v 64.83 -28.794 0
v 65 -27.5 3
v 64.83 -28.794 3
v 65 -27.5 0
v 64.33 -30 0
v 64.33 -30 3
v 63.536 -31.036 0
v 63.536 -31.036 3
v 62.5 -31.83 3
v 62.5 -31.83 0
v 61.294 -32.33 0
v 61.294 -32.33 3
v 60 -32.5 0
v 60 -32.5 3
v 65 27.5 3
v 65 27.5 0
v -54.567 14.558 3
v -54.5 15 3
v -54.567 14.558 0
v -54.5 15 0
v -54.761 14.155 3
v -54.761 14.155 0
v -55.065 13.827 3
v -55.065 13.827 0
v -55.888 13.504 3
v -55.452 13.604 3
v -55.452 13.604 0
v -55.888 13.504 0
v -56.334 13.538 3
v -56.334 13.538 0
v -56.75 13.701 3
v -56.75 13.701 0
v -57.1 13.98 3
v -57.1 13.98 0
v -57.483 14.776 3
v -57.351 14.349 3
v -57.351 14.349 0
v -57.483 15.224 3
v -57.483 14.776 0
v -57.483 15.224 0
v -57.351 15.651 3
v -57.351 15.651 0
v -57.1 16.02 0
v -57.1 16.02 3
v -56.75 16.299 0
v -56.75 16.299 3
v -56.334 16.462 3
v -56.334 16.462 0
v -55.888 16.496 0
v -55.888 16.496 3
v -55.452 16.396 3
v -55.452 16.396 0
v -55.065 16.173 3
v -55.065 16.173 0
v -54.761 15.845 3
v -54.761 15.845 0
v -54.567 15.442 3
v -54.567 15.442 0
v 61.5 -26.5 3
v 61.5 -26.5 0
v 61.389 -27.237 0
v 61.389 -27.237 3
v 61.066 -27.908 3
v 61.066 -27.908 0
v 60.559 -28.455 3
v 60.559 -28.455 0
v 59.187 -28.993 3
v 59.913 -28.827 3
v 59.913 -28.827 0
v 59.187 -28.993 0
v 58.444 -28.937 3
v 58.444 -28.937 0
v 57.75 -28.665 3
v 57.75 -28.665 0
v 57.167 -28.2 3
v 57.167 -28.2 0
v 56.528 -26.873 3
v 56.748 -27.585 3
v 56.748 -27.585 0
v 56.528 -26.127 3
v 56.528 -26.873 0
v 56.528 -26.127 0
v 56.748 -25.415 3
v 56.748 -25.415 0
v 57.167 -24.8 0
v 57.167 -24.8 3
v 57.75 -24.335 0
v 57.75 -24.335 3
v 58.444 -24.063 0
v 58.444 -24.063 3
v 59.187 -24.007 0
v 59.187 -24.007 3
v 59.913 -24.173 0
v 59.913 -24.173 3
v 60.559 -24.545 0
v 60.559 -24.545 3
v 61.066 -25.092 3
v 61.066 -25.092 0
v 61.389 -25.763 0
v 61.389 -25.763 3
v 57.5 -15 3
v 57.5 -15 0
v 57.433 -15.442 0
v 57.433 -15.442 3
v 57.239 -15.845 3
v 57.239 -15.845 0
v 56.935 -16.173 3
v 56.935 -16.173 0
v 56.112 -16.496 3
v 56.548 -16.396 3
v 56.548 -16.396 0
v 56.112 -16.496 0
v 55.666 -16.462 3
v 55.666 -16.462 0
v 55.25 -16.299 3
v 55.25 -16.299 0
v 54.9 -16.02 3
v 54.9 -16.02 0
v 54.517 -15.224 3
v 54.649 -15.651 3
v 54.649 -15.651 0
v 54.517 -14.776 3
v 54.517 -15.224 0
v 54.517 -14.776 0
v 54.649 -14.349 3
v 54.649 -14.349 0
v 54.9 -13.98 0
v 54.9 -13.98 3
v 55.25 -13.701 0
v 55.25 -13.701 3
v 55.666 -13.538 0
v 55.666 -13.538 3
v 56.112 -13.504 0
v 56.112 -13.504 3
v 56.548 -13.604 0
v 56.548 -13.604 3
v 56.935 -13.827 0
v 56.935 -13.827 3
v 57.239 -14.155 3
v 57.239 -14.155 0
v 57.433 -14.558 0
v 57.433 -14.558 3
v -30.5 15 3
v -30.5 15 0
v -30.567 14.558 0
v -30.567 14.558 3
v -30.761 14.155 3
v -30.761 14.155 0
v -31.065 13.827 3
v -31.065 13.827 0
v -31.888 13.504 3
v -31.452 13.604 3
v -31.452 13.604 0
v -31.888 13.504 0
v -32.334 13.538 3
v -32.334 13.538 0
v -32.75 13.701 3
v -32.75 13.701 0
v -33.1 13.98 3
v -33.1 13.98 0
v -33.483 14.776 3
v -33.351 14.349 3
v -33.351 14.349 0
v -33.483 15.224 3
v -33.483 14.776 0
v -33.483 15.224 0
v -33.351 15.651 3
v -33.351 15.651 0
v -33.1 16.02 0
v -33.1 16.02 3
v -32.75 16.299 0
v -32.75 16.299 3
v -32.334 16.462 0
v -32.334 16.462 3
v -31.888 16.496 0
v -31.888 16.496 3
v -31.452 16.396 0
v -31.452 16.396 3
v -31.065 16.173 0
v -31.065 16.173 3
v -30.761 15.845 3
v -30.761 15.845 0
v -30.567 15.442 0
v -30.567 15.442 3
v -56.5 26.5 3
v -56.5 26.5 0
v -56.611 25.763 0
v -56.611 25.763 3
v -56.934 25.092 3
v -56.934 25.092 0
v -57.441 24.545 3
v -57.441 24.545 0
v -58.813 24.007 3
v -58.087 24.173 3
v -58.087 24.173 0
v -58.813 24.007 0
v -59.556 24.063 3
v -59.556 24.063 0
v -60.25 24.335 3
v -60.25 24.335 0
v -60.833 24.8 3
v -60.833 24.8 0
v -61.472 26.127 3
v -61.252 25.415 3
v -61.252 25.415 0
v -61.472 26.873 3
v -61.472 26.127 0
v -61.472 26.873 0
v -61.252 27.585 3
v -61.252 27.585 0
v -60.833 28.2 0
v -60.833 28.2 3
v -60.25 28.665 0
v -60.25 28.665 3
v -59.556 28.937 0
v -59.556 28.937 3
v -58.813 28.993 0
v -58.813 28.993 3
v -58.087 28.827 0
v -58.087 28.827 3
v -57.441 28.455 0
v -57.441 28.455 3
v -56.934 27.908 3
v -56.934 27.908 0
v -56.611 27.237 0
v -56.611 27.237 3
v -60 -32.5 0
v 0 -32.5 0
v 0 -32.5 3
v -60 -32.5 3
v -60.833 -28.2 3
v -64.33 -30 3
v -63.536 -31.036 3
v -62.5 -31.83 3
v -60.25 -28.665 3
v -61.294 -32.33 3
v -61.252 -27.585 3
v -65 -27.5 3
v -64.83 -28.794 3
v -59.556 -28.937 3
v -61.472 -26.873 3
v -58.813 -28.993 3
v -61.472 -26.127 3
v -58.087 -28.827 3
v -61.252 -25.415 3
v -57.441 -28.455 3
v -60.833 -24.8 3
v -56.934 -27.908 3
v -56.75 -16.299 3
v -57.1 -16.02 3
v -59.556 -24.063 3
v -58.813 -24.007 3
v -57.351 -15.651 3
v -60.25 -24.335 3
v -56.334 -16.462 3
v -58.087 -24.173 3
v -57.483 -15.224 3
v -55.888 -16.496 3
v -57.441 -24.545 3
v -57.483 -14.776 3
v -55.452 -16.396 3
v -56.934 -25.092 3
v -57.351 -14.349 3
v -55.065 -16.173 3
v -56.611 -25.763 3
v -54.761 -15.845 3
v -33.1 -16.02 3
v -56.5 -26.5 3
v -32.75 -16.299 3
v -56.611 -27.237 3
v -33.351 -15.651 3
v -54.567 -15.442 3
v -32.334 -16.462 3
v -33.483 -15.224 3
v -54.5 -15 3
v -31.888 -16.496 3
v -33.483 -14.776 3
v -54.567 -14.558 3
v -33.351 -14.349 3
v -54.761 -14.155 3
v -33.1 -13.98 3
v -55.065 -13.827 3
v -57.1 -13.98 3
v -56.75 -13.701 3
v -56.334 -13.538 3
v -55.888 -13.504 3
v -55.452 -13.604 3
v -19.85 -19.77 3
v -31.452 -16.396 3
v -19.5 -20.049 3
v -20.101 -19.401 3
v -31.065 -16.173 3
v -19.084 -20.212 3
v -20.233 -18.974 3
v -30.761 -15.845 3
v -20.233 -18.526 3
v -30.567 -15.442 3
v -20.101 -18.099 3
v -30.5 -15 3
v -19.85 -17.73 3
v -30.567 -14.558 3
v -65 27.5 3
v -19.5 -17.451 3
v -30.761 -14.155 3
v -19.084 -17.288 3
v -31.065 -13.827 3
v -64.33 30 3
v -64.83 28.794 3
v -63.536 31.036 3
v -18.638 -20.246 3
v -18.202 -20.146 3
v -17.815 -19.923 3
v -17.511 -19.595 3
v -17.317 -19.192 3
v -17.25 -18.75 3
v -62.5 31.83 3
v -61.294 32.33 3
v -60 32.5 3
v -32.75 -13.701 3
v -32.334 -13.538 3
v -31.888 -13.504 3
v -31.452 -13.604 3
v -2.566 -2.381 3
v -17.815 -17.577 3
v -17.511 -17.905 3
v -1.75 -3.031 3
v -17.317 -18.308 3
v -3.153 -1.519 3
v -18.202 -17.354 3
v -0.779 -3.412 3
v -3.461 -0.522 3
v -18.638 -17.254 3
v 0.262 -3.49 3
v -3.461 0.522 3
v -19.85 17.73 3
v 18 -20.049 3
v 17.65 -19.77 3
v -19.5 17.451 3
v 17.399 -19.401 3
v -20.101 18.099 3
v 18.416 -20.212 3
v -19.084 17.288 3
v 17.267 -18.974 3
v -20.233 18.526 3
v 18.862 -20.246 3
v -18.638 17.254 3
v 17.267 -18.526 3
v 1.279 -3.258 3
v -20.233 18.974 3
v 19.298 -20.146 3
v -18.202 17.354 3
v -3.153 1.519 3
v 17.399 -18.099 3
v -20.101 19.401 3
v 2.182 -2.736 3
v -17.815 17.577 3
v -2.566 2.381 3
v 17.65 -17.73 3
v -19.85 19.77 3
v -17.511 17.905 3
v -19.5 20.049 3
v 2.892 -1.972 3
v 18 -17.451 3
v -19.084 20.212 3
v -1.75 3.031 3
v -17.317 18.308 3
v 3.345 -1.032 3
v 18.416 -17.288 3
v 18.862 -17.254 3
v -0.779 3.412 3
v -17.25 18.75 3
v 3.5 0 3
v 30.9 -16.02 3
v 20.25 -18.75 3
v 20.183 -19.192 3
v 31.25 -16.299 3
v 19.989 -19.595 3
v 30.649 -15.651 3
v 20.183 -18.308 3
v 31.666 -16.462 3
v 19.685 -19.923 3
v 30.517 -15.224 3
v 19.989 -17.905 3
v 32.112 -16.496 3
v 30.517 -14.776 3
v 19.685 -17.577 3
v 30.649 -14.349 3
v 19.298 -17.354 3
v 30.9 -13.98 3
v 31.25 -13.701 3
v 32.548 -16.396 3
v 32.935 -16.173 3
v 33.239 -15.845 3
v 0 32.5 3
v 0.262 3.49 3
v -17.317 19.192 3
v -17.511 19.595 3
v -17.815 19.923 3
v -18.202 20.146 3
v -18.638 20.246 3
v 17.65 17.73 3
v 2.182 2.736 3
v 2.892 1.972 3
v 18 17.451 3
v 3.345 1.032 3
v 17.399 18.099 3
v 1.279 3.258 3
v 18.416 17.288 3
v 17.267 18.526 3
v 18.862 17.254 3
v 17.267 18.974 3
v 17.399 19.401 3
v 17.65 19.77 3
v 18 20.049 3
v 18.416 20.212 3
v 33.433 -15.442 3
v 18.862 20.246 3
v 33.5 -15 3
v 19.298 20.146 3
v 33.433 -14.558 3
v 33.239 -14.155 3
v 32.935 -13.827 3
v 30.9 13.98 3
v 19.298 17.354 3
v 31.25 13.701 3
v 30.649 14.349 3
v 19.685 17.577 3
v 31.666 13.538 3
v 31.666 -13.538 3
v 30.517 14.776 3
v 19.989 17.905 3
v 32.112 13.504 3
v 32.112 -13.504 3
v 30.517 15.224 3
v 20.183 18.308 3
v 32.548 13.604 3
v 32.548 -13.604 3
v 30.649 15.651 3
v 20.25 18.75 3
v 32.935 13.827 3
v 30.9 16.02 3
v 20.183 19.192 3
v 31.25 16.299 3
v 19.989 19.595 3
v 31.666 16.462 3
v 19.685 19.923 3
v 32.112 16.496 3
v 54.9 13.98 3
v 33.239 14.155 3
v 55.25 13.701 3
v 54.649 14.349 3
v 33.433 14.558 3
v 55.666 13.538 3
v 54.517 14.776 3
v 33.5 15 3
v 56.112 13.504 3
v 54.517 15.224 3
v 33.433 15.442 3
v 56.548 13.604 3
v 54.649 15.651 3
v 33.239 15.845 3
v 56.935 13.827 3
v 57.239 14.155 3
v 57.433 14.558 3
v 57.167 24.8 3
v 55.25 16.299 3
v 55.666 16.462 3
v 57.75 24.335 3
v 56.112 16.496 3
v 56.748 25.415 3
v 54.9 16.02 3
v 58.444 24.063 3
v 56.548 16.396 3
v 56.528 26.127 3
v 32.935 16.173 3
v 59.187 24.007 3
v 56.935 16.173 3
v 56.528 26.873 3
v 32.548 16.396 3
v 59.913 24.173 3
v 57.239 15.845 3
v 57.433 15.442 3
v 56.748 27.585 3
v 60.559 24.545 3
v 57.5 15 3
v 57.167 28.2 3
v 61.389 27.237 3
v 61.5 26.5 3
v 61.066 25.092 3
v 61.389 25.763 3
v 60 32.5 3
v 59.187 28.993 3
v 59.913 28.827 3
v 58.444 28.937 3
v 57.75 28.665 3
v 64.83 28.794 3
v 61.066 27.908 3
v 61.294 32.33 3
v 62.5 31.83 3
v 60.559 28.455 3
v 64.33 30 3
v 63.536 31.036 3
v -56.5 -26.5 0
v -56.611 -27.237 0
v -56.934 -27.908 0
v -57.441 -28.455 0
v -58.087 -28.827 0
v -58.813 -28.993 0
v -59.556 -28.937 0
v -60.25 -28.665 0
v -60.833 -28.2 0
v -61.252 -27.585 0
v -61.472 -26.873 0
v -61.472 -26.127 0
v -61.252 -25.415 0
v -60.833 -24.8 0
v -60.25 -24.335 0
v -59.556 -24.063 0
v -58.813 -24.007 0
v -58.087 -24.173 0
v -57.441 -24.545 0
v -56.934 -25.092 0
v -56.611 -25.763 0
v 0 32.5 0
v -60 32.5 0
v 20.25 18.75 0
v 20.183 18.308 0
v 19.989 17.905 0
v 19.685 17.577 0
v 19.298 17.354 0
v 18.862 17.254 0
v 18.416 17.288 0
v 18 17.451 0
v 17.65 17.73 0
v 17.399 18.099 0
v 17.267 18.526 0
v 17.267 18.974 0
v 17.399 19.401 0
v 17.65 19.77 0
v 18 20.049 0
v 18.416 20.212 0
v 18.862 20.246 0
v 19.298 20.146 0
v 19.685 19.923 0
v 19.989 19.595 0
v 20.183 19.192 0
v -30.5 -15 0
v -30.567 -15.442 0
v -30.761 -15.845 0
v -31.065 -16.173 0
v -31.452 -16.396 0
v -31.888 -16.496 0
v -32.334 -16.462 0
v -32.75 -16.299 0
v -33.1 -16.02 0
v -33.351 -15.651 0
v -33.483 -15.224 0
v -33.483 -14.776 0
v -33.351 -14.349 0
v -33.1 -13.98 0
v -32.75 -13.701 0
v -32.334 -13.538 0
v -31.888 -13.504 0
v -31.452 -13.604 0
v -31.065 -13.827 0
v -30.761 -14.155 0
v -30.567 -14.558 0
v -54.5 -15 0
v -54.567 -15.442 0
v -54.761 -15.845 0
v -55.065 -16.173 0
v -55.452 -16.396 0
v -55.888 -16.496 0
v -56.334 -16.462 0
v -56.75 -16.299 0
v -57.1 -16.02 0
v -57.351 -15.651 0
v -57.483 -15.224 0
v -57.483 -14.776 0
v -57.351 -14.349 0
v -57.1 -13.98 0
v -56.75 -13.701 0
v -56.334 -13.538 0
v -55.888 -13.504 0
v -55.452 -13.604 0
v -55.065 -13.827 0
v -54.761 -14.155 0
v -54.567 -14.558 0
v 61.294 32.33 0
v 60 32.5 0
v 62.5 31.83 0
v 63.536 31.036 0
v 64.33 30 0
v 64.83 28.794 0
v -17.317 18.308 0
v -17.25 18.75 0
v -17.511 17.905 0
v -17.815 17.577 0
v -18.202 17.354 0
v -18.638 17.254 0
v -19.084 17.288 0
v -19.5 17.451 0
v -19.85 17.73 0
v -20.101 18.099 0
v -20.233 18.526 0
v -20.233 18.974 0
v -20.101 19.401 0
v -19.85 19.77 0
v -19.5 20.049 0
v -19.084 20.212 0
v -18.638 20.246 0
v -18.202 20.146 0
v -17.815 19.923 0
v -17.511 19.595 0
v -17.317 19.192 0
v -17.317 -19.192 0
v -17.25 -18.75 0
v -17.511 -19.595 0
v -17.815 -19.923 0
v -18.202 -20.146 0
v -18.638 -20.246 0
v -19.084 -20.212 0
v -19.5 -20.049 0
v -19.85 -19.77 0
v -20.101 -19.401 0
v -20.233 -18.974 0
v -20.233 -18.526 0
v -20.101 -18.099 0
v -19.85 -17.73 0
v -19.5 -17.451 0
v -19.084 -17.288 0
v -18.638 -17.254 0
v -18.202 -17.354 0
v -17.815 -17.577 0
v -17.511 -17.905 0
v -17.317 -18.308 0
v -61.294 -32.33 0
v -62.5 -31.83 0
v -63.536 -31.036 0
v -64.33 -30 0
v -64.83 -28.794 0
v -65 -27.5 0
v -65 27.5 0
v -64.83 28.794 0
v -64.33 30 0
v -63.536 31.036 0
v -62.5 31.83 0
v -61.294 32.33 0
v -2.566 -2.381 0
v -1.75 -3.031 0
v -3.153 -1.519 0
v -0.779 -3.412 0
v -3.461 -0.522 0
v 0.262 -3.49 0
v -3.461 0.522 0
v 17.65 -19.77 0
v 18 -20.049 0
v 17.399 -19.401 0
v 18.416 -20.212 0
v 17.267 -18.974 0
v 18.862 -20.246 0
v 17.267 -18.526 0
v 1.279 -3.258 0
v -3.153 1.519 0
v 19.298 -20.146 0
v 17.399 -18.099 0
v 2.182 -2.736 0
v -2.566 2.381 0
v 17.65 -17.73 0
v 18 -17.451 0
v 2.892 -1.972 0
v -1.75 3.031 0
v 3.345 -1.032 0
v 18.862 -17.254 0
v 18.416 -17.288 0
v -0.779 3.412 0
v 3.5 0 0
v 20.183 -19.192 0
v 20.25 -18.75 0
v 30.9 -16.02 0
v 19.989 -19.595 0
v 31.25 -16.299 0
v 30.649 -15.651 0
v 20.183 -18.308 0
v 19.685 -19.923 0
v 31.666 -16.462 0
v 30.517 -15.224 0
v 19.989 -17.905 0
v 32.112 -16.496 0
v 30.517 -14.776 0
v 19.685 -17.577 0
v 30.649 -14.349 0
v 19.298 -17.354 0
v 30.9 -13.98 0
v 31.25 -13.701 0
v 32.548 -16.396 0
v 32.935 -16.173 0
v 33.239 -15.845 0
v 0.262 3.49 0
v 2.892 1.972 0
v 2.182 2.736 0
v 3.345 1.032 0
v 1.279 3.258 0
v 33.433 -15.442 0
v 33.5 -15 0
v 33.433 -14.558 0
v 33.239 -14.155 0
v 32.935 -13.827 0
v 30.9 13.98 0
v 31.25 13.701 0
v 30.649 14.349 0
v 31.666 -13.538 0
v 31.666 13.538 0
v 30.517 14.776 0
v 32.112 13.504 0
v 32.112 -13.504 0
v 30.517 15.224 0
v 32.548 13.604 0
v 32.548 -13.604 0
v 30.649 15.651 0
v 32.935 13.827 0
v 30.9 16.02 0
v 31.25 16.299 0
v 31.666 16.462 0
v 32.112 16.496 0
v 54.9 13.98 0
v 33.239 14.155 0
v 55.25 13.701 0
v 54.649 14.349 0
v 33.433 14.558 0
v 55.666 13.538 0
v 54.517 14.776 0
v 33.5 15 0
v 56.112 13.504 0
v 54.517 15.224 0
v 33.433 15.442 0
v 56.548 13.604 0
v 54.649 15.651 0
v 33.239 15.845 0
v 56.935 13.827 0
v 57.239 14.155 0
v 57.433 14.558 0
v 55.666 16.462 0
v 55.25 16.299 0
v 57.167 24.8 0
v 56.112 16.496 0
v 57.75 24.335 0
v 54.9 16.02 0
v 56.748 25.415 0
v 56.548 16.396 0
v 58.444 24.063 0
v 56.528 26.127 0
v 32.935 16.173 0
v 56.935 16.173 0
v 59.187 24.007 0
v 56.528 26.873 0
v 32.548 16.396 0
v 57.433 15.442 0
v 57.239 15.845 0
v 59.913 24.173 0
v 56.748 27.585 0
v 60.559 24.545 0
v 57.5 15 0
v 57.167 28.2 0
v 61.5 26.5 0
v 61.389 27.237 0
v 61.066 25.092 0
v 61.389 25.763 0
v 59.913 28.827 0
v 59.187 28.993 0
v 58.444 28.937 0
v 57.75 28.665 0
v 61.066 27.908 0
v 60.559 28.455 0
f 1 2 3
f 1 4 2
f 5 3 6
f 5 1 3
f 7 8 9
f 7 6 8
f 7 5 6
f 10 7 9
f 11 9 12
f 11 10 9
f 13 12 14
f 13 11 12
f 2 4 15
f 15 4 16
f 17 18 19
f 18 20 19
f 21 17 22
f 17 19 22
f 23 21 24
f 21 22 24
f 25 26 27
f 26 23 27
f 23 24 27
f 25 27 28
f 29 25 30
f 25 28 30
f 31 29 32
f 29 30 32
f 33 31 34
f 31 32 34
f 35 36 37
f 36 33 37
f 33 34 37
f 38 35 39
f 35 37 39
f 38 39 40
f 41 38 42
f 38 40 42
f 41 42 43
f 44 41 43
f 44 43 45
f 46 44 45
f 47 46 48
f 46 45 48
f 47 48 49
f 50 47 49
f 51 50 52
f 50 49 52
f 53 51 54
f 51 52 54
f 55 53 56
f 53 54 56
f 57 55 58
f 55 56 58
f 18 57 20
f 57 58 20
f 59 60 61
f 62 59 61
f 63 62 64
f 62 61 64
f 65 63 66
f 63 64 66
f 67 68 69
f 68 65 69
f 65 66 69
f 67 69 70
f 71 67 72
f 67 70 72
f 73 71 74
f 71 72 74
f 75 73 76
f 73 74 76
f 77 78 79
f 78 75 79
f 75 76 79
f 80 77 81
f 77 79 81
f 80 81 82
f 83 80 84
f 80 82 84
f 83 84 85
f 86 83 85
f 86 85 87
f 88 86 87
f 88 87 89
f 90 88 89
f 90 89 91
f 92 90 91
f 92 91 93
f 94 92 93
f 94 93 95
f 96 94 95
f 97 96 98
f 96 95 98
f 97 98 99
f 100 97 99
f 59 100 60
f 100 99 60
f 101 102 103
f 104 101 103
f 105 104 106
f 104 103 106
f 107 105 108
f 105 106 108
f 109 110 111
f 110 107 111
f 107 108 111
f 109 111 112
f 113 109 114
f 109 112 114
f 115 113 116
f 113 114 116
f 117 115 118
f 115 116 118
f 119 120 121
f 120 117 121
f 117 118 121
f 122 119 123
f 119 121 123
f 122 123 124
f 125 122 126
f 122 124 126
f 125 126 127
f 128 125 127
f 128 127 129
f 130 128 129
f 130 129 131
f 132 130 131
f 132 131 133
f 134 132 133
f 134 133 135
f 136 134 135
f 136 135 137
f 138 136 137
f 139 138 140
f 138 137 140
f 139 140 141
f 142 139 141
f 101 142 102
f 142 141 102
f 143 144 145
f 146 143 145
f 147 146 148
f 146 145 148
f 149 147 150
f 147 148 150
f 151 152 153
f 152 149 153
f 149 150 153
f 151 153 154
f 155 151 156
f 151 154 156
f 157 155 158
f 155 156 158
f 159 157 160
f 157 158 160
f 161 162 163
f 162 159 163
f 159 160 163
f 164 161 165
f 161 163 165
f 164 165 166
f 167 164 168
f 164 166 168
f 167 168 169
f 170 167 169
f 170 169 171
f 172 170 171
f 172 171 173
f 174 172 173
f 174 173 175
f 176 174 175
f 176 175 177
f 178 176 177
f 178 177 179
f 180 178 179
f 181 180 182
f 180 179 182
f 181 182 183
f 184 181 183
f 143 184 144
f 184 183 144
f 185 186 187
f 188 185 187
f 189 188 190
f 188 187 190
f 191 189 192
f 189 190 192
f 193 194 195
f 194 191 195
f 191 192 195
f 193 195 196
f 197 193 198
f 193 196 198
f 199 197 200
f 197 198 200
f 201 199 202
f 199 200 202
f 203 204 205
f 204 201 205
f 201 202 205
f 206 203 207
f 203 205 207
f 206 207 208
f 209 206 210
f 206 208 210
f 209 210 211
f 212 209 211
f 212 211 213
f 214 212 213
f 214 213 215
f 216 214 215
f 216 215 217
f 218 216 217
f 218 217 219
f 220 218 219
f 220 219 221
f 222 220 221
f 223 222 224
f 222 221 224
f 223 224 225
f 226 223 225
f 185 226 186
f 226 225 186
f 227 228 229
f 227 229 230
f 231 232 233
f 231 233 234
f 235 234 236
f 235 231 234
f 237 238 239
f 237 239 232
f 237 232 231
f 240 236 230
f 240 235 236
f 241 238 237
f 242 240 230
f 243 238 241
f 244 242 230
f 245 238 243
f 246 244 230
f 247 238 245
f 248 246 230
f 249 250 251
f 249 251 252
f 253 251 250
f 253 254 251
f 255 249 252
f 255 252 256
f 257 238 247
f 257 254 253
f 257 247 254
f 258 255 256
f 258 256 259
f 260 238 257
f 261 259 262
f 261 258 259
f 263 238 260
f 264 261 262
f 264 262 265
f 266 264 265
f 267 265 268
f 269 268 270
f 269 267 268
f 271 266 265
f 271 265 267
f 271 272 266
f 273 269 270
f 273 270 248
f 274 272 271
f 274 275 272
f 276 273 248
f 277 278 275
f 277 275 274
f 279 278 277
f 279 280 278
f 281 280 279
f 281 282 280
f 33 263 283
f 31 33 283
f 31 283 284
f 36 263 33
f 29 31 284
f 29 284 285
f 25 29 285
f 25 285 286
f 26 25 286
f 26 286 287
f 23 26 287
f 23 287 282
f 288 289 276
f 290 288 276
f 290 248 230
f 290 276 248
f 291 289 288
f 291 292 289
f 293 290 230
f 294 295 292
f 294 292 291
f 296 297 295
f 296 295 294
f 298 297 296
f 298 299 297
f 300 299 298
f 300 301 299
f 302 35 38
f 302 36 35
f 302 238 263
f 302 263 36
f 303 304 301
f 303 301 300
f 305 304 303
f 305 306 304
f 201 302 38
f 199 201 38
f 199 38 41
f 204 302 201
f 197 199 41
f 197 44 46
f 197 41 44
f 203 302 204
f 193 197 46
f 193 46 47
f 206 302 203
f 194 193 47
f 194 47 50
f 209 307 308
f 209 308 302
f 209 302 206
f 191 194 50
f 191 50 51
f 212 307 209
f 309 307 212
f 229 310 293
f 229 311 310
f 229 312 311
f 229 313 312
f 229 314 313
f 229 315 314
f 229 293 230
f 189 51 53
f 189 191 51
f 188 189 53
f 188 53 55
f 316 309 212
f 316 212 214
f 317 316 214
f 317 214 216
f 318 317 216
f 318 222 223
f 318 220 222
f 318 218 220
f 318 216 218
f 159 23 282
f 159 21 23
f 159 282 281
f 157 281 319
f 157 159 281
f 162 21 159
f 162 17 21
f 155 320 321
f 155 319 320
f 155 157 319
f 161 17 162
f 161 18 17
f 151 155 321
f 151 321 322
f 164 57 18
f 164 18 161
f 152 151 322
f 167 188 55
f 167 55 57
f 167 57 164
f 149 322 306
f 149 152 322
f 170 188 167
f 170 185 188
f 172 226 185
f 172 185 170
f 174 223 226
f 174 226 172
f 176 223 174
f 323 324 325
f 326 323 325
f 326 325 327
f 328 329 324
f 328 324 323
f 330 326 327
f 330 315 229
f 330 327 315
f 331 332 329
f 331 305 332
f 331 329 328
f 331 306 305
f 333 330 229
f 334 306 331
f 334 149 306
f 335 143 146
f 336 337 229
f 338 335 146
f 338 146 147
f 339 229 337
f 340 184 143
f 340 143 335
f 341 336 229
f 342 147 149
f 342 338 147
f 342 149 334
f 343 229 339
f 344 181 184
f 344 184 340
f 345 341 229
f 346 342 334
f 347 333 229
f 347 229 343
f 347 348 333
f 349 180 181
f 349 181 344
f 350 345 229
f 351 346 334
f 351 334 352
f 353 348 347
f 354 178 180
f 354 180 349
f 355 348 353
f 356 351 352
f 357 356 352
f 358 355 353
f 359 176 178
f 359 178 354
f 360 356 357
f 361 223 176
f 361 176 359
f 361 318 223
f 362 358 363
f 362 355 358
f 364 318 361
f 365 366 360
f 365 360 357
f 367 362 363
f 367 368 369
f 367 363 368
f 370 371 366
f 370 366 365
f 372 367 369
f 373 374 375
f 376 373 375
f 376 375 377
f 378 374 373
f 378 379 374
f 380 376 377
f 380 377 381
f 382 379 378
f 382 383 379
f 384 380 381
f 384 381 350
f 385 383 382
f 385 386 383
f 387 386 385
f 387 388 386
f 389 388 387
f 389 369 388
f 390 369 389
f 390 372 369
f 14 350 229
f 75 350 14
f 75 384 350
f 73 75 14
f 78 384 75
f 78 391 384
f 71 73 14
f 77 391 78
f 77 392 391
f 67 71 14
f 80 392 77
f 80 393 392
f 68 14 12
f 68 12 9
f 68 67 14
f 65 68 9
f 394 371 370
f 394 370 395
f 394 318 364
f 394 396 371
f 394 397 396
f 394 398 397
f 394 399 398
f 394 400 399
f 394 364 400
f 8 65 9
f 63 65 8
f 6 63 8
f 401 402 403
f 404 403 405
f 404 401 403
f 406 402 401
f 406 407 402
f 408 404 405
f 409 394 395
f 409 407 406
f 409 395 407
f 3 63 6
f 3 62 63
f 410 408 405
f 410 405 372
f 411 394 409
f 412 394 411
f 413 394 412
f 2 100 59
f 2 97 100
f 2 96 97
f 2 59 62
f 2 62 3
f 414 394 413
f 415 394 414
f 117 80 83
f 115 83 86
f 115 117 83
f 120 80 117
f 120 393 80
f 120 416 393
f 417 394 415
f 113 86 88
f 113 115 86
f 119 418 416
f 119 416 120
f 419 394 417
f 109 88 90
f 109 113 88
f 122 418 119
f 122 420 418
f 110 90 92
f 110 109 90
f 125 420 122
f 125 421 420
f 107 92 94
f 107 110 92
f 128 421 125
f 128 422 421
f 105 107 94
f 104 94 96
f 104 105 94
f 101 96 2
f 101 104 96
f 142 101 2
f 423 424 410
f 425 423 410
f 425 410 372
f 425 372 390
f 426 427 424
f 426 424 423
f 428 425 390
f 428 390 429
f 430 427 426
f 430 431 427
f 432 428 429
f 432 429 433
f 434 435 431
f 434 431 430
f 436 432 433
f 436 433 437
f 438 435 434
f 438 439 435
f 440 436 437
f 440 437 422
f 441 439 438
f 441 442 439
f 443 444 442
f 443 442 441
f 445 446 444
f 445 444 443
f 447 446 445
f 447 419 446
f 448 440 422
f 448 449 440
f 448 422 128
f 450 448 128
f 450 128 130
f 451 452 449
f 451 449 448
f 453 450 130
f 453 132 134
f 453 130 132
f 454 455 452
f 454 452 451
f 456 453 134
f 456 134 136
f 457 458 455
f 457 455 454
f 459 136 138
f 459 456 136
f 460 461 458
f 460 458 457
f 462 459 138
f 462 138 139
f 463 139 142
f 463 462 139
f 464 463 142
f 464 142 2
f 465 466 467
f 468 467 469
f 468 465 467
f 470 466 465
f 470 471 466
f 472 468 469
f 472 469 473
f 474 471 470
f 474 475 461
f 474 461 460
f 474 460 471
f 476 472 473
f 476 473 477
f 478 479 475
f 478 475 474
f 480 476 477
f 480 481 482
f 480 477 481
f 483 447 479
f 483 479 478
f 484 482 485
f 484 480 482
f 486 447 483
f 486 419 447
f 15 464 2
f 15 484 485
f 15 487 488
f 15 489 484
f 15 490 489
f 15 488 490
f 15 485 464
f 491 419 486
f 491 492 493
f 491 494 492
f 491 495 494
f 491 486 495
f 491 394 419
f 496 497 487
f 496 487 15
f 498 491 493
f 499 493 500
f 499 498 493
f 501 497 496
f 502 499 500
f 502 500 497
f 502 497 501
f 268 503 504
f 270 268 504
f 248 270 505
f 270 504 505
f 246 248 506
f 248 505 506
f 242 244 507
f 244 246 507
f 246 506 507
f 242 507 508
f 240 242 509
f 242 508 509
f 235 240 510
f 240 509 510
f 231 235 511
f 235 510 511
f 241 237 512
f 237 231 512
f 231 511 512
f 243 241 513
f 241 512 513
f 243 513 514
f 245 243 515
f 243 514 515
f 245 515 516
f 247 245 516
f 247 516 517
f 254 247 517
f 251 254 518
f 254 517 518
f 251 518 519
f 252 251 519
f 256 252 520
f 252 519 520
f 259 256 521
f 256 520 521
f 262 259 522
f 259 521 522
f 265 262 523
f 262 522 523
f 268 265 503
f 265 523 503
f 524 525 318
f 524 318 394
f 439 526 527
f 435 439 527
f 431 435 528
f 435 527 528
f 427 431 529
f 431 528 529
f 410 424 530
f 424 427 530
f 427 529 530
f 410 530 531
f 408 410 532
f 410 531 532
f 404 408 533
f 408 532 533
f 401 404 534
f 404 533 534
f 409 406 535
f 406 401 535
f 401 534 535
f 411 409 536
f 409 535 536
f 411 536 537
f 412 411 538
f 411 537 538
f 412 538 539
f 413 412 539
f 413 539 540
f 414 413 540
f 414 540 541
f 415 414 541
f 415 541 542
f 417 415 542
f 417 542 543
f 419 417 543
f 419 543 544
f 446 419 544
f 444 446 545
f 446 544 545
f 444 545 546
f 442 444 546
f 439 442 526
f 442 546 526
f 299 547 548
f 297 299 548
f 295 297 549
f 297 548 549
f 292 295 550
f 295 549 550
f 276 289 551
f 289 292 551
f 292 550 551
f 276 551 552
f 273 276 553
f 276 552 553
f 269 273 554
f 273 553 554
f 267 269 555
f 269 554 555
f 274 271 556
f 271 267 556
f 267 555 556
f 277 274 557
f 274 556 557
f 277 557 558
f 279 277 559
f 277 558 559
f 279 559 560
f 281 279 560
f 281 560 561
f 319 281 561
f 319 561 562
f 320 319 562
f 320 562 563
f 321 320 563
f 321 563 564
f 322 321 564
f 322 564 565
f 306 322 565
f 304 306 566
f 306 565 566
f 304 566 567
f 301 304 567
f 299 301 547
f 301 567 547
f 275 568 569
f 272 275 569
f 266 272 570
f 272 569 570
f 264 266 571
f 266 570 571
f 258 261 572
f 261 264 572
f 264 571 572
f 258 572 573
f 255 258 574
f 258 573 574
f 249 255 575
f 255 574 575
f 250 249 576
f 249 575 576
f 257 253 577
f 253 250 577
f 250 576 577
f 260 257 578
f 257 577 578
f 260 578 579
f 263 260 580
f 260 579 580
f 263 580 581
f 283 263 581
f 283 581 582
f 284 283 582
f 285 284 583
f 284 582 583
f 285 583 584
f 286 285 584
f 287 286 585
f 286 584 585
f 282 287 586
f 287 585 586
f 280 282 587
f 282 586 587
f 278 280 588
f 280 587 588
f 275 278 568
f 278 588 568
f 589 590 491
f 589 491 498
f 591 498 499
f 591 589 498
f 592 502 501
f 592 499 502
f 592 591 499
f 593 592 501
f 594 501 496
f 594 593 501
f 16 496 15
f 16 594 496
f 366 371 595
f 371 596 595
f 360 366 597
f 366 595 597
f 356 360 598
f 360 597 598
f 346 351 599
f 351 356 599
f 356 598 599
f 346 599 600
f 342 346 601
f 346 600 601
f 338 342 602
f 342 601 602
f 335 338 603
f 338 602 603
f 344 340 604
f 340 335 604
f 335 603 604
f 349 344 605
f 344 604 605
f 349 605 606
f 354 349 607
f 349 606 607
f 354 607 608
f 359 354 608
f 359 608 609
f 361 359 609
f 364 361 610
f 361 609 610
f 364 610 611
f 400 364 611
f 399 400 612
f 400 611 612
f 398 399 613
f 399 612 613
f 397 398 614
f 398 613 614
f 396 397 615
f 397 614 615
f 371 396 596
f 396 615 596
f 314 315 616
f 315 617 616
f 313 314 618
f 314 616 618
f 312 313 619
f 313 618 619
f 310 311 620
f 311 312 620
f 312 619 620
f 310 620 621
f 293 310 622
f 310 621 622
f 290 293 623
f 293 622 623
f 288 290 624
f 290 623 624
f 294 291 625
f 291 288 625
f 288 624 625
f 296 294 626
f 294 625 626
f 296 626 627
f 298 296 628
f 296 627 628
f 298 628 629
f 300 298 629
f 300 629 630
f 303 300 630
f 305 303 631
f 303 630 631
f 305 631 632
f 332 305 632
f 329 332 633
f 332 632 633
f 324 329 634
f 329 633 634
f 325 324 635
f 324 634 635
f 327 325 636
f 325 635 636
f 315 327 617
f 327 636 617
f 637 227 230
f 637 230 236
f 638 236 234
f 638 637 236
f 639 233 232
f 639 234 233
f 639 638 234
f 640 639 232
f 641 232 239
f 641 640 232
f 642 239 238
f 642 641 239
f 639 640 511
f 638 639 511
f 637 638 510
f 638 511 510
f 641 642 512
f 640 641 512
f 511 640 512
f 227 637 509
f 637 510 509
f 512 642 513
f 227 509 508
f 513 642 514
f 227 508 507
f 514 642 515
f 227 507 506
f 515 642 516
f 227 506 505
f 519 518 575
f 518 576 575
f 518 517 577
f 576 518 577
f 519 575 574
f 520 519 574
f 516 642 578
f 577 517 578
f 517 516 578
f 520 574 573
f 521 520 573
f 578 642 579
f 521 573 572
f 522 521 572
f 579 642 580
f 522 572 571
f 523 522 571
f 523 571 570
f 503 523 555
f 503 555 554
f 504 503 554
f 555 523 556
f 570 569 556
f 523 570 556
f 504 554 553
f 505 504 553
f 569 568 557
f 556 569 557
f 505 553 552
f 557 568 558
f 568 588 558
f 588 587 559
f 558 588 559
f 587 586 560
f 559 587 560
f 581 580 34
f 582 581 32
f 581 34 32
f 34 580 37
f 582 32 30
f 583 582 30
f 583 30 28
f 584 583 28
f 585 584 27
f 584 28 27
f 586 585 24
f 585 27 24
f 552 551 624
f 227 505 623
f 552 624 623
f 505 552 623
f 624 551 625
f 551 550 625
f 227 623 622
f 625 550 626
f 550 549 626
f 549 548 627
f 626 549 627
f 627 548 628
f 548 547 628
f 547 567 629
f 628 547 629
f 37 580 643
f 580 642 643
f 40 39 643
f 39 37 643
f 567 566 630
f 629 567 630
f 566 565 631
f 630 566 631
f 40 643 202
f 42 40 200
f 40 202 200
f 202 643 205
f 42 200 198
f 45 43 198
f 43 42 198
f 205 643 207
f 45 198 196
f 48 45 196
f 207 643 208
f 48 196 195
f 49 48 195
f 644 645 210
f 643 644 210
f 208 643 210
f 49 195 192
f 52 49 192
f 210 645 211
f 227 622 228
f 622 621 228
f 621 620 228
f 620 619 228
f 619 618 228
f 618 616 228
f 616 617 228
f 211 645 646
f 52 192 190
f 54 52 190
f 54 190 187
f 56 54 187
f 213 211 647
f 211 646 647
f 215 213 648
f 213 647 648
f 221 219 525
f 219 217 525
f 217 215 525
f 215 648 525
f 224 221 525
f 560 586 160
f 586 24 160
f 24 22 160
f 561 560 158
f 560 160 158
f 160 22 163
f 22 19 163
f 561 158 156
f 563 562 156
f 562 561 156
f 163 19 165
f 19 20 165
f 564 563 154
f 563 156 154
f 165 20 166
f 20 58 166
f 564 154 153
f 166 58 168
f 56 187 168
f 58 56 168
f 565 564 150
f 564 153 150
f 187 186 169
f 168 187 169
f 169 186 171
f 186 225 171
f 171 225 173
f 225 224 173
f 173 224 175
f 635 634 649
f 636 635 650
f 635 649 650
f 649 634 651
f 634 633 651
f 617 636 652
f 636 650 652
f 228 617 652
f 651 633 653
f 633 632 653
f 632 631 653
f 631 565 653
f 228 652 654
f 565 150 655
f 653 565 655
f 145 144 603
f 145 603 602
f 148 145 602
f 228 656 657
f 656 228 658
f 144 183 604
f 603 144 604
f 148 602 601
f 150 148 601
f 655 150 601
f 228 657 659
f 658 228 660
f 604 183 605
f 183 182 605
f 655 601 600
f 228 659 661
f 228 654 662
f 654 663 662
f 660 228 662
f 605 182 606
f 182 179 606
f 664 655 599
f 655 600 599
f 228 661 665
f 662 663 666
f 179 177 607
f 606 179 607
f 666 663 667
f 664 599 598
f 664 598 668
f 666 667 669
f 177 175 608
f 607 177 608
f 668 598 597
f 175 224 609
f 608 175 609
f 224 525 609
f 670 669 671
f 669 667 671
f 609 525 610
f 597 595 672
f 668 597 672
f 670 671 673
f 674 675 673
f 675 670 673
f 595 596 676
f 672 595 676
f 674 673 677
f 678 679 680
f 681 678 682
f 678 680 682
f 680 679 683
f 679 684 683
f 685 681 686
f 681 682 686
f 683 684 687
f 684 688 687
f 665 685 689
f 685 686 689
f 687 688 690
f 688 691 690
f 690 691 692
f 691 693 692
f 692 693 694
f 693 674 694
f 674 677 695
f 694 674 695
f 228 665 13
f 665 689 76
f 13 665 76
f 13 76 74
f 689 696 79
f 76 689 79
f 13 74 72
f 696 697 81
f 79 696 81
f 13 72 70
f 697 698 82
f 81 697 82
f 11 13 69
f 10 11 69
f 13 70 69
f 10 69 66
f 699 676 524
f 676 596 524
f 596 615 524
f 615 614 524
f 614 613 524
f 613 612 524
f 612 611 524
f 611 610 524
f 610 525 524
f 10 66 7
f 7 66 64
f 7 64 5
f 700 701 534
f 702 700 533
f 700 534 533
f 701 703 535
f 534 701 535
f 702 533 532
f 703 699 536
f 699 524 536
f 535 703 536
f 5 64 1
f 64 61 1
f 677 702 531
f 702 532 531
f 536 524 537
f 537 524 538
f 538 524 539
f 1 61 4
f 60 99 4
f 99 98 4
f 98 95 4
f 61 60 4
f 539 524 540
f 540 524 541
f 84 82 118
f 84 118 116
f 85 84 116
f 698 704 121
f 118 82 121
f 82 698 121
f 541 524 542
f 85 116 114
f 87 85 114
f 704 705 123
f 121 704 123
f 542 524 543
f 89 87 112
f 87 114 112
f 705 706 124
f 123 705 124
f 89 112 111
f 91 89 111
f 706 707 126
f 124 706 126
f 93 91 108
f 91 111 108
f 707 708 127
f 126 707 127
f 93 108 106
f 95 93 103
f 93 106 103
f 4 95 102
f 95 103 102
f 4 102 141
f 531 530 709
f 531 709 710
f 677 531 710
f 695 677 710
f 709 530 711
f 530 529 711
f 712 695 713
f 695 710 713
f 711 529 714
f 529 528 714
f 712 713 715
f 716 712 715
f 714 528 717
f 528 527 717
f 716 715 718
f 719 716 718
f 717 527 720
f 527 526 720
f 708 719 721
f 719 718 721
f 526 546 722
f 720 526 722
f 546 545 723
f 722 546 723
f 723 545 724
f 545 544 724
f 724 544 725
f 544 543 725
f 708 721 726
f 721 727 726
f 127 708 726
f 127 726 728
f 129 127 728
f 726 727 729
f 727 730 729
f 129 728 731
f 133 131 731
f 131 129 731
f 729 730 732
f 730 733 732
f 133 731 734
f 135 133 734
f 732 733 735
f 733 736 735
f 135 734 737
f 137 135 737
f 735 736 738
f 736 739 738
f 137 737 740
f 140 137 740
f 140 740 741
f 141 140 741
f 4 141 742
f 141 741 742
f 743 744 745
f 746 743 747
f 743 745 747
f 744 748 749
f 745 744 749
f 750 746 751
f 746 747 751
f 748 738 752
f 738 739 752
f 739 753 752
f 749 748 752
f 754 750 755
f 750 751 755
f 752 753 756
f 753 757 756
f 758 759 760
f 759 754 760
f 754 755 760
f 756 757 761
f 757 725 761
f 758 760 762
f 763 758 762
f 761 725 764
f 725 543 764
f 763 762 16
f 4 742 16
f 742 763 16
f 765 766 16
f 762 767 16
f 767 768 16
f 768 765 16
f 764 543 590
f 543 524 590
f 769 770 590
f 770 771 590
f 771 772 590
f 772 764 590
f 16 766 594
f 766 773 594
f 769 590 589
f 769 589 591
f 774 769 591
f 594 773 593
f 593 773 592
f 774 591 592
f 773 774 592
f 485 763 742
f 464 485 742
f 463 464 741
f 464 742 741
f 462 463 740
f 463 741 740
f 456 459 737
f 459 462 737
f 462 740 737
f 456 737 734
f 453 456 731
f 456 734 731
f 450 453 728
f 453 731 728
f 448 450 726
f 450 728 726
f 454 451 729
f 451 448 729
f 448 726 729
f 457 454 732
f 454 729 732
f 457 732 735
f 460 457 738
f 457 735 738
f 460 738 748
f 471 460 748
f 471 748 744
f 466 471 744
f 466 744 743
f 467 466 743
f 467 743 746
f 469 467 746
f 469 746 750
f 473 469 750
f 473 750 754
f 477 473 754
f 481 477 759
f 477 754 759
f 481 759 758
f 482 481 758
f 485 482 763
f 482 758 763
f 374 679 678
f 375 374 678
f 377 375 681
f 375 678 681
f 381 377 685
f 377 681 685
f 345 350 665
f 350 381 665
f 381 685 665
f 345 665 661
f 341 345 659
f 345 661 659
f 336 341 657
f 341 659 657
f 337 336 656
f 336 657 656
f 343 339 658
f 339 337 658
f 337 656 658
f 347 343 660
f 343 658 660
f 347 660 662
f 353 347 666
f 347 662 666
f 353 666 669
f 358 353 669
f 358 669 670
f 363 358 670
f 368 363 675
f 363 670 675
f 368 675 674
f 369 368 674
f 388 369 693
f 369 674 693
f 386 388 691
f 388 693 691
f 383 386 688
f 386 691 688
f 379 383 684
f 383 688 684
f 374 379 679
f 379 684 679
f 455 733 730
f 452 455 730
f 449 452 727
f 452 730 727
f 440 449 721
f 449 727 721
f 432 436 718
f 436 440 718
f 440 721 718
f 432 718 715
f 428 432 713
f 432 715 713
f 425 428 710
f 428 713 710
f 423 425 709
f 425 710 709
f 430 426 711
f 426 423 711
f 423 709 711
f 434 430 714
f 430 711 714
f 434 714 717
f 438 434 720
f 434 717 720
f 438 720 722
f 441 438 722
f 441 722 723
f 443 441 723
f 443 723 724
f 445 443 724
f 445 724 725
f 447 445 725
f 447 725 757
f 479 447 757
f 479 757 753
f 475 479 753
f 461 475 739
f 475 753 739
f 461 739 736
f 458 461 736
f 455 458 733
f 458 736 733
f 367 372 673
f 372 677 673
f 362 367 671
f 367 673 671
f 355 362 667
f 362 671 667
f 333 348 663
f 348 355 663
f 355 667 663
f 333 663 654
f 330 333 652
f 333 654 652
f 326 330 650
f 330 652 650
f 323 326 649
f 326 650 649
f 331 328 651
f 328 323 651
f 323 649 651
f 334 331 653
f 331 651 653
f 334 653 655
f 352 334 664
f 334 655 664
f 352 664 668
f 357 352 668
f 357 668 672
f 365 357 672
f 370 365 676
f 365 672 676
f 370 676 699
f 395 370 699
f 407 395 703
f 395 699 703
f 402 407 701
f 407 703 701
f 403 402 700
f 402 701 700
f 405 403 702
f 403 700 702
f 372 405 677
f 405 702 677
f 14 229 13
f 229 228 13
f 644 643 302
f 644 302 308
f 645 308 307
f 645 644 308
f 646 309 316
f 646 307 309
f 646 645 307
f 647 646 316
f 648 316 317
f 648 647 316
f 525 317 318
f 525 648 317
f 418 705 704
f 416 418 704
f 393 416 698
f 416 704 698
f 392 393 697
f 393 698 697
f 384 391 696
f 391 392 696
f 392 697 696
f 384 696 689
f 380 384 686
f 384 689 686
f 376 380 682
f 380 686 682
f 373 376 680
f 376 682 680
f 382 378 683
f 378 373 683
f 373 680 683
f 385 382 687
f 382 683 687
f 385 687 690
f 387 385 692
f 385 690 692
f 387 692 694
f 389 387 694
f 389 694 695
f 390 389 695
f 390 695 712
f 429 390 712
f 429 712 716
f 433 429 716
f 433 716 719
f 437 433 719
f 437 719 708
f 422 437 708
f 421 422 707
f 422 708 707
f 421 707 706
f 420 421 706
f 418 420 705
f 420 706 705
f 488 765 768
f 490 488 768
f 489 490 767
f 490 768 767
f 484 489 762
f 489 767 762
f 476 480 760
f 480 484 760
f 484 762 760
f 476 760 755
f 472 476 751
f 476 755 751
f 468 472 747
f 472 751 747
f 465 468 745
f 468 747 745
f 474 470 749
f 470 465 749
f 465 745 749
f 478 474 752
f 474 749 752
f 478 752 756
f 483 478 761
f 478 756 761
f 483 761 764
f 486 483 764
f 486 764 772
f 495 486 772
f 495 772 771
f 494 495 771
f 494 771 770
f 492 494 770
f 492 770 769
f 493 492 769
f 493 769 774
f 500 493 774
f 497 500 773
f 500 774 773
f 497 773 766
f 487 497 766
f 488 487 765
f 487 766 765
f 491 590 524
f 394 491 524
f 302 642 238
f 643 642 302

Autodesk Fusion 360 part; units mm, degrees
sketch "Sketch1" plane through (0, 0, 0) normal (0, 0, 1) x (1, 0, 0)
  line L0 (-60, 32.5) -> (0, 32.5)
  line L1 (0, -32.5) -> (-60, -32.5)
  line L2 (-65, -27.5) -> (-65, 27.5)
  arc A0 (-60, 32.5) -> (-65, 27.5) centre (-60, 27.5) ccw
  arc A1 (-65, -27.5) -> (-60, -32.5) centre (-60, -27.5) ccw
  circle A2 centre (-59, 26.5) radius 2.5
  circle A3 centre (-59, -26.5) radius 2.5
  circle A4 centre (0, 0) radius 3.5
  circle A5 centre (-56, 15) radius 1.5
  circle A6 centre (-56, -15) radius 1.5
  circle A7 centre (-32, 15) radius 1.5
  circle A8 centre (-32, -15) radius 1.5
  line L3 (0, 32.5) -> (0, -32.5) construction
  line L4 (65, -27.5) -> (65, 27.5)
  circle A9 centre (59, 26.5) radius 2.5
  arc A10 (60, -32.5) -> (65, -27.5) centre (60, -27.5) ccw
  circle A11 centre (32, 15) radius 1.5
  circle A12 centre (56, 15) radius 1.5
  circle A13 centre (56, -15) radius 1.5
  circle A14 centre (59, -26.5) radius 2.5
  arc A15 (65, 27.5) -> (60, 32.5) centre (60, 27.5) ccw
  line L5 (0, -32.5) -> (60, -32.5)
  line L6 (60, 32.5) -> (0, 32.5)
  circle A16 centre (32, -15) radius 1.5
  circle A17 centre (-18.75, 18.75) radius 1.5
  circle A18 centre (-18.75, -18.75) radius 1.5
  circle A19 centre (18.75, -18.75) radius 1.5
  circle A20 centre (18.75, 18.75) radius 1.5
  dimension "d1" = 65
  dimension "d3" = 32.5
  dimension "d4" = 32.5
  dimension "d5" = 5
  dimension "d6" = 5
  dimension "d9" = 5
  dimension "d10" = 6
  dimension "d11" = 6
  dimension "d12" = 5
  dimension "d13" = 6
  dimension "d14" = 6
  dimension "d21" = 7
  dimension "d24" = 9
  dimension "d25" = 9
  dimension "d26" = 30
  dimension "d27" = 3
  dimension "d28" = 3
  dimension "d29" = 17.5
  dimension "d30" = 3
  dimension "d31" = 3
  dimension "d32" = 30
  dimension "d33" = 17.5
  dimension "d34" = 24
  dimension "d35" = 65
  dimension "d36" = 65
  dimension "d41" = 3
  dimension "d42" = 3
  dimension "d43" = 37.5
  dimension "d44" = 13.75
  dimension "d45" = 18.75
extrude "Extrude4" add sketch "Sketch1" along normal blind 3
equation "d3 = ( 65 / 2 ) * 1 mm"
equation "d4 = d3"
equation "d6 = d5"
equation "d11 = d10"
equation "d12 = d9"
equation "d13 = d10"
equation "d14 = d10"
equation "d25 = d24"
equation "d28 = d27"
equation "d30 = d27"
equation "d31 = d27"
equation "d32 = d26"
equation "d33 = d29"
equation "d35 = d1"
equation "d36 = d1"
equation "d42 = d41"
equation "d44 = d3 - d43 / 2"
equation "d45 = ( 37.5 / 2 ) * 1 mm"
